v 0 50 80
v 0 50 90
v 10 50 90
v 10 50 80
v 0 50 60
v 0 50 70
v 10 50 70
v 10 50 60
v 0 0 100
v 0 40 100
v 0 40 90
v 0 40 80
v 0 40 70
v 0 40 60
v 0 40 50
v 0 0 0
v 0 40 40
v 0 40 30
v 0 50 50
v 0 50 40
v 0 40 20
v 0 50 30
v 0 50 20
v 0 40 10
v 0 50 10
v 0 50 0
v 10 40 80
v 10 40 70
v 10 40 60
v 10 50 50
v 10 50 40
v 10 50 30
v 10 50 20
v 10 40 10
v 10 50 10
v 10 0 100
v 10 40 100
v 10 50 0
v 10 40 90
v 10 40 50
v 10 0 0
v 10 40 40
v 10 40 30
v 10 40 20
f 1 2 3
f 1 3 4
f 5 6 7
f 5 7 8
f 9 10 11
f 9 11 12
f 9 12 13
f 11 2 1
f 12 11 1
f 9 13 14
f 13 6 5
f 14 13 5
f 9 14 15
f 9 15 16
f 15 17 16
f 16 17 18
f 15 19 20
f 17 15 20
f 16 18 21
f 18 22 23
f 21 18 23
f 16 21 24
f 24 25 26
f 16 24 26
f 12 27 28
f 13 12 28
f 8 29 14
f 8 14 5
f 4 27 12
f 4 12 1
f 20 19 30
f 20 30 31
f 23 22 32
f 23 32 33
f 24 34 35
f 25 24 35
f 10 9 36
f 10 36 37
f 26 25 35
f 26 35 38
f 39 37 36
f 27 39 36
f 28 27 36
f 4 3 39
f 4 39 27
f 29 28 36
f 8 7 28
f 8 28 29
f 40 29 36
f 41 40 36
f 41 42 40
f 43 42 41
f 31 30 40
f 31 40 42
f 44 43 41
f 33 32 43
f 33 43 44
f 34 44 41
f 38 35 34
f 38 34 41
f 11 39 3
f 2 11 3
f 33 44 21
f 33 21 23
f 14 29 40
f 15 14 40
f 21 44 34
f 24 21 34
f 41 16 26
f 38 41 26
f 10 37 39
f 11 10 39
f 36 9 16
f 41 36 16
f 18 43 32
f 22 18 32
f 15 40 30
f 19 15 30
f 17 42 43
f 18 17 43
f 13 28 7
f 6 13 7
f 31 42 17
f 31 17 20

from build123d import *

# Parameters (mm, degrees)
ESQUISSE1_W                = 100
ESQUISSE1_H                = 50
BOSS_EXTRU_1_DEPTH         = 10
ESQUISSE2_W                = 10
ESQUISSE2_H                = 10
ENL_V_MAT_EXTRU_1_DEPTH    = 10
R_P_TITION_LIN_AIRE1_COUNT = 5
R_P_TITION_LIN_AIRE1_PITCH = 20


with BuildPart() as part:
    # Esquisse1 → Boss.-Extru.1 (new body)
    with BuildSketch(Plane(origin=(0, 0, 0), x_dir=(0, 0, -1), z_dir=(1, 0, 0))):
        with Locations((-50, 25)):
            Rectangle(ESQUISSE1_W, ESQUISSE1_H)
    extrude(amount=BOSS_EXTRU_1_DEPTH)

    # Esquisse2 → Enlèv. mat.-Extru.1 (cut)
    with BuildSketch(Plane(origin=(10, 0, 0), x_dir=(0, 0, -1), z_dir=(1, 0, 0))):
        with Locations((-15, 45)):
            Rectangle(ESQUISSE2_W, ESQUISSE2_H)
    enl_v_mat_extru_1 = extrude(amount=-ENL_V_MAT_EXTRU_1_DEPTH, mode=Mode.SUBTRACT)

    # Répétition linéaire1: Enlèv. mat.-Extru.1 ×5
    with Locations(*[(0, 0, i * R_P_TITION_LIN_AIRE1_PITCH) for i in range(1, R_P_TITION_LIN_AIRE1_COUNT)]):
        add(enl_v_mat_extru_1, mode=Mode.SUBTRACT)


solid = part.part
